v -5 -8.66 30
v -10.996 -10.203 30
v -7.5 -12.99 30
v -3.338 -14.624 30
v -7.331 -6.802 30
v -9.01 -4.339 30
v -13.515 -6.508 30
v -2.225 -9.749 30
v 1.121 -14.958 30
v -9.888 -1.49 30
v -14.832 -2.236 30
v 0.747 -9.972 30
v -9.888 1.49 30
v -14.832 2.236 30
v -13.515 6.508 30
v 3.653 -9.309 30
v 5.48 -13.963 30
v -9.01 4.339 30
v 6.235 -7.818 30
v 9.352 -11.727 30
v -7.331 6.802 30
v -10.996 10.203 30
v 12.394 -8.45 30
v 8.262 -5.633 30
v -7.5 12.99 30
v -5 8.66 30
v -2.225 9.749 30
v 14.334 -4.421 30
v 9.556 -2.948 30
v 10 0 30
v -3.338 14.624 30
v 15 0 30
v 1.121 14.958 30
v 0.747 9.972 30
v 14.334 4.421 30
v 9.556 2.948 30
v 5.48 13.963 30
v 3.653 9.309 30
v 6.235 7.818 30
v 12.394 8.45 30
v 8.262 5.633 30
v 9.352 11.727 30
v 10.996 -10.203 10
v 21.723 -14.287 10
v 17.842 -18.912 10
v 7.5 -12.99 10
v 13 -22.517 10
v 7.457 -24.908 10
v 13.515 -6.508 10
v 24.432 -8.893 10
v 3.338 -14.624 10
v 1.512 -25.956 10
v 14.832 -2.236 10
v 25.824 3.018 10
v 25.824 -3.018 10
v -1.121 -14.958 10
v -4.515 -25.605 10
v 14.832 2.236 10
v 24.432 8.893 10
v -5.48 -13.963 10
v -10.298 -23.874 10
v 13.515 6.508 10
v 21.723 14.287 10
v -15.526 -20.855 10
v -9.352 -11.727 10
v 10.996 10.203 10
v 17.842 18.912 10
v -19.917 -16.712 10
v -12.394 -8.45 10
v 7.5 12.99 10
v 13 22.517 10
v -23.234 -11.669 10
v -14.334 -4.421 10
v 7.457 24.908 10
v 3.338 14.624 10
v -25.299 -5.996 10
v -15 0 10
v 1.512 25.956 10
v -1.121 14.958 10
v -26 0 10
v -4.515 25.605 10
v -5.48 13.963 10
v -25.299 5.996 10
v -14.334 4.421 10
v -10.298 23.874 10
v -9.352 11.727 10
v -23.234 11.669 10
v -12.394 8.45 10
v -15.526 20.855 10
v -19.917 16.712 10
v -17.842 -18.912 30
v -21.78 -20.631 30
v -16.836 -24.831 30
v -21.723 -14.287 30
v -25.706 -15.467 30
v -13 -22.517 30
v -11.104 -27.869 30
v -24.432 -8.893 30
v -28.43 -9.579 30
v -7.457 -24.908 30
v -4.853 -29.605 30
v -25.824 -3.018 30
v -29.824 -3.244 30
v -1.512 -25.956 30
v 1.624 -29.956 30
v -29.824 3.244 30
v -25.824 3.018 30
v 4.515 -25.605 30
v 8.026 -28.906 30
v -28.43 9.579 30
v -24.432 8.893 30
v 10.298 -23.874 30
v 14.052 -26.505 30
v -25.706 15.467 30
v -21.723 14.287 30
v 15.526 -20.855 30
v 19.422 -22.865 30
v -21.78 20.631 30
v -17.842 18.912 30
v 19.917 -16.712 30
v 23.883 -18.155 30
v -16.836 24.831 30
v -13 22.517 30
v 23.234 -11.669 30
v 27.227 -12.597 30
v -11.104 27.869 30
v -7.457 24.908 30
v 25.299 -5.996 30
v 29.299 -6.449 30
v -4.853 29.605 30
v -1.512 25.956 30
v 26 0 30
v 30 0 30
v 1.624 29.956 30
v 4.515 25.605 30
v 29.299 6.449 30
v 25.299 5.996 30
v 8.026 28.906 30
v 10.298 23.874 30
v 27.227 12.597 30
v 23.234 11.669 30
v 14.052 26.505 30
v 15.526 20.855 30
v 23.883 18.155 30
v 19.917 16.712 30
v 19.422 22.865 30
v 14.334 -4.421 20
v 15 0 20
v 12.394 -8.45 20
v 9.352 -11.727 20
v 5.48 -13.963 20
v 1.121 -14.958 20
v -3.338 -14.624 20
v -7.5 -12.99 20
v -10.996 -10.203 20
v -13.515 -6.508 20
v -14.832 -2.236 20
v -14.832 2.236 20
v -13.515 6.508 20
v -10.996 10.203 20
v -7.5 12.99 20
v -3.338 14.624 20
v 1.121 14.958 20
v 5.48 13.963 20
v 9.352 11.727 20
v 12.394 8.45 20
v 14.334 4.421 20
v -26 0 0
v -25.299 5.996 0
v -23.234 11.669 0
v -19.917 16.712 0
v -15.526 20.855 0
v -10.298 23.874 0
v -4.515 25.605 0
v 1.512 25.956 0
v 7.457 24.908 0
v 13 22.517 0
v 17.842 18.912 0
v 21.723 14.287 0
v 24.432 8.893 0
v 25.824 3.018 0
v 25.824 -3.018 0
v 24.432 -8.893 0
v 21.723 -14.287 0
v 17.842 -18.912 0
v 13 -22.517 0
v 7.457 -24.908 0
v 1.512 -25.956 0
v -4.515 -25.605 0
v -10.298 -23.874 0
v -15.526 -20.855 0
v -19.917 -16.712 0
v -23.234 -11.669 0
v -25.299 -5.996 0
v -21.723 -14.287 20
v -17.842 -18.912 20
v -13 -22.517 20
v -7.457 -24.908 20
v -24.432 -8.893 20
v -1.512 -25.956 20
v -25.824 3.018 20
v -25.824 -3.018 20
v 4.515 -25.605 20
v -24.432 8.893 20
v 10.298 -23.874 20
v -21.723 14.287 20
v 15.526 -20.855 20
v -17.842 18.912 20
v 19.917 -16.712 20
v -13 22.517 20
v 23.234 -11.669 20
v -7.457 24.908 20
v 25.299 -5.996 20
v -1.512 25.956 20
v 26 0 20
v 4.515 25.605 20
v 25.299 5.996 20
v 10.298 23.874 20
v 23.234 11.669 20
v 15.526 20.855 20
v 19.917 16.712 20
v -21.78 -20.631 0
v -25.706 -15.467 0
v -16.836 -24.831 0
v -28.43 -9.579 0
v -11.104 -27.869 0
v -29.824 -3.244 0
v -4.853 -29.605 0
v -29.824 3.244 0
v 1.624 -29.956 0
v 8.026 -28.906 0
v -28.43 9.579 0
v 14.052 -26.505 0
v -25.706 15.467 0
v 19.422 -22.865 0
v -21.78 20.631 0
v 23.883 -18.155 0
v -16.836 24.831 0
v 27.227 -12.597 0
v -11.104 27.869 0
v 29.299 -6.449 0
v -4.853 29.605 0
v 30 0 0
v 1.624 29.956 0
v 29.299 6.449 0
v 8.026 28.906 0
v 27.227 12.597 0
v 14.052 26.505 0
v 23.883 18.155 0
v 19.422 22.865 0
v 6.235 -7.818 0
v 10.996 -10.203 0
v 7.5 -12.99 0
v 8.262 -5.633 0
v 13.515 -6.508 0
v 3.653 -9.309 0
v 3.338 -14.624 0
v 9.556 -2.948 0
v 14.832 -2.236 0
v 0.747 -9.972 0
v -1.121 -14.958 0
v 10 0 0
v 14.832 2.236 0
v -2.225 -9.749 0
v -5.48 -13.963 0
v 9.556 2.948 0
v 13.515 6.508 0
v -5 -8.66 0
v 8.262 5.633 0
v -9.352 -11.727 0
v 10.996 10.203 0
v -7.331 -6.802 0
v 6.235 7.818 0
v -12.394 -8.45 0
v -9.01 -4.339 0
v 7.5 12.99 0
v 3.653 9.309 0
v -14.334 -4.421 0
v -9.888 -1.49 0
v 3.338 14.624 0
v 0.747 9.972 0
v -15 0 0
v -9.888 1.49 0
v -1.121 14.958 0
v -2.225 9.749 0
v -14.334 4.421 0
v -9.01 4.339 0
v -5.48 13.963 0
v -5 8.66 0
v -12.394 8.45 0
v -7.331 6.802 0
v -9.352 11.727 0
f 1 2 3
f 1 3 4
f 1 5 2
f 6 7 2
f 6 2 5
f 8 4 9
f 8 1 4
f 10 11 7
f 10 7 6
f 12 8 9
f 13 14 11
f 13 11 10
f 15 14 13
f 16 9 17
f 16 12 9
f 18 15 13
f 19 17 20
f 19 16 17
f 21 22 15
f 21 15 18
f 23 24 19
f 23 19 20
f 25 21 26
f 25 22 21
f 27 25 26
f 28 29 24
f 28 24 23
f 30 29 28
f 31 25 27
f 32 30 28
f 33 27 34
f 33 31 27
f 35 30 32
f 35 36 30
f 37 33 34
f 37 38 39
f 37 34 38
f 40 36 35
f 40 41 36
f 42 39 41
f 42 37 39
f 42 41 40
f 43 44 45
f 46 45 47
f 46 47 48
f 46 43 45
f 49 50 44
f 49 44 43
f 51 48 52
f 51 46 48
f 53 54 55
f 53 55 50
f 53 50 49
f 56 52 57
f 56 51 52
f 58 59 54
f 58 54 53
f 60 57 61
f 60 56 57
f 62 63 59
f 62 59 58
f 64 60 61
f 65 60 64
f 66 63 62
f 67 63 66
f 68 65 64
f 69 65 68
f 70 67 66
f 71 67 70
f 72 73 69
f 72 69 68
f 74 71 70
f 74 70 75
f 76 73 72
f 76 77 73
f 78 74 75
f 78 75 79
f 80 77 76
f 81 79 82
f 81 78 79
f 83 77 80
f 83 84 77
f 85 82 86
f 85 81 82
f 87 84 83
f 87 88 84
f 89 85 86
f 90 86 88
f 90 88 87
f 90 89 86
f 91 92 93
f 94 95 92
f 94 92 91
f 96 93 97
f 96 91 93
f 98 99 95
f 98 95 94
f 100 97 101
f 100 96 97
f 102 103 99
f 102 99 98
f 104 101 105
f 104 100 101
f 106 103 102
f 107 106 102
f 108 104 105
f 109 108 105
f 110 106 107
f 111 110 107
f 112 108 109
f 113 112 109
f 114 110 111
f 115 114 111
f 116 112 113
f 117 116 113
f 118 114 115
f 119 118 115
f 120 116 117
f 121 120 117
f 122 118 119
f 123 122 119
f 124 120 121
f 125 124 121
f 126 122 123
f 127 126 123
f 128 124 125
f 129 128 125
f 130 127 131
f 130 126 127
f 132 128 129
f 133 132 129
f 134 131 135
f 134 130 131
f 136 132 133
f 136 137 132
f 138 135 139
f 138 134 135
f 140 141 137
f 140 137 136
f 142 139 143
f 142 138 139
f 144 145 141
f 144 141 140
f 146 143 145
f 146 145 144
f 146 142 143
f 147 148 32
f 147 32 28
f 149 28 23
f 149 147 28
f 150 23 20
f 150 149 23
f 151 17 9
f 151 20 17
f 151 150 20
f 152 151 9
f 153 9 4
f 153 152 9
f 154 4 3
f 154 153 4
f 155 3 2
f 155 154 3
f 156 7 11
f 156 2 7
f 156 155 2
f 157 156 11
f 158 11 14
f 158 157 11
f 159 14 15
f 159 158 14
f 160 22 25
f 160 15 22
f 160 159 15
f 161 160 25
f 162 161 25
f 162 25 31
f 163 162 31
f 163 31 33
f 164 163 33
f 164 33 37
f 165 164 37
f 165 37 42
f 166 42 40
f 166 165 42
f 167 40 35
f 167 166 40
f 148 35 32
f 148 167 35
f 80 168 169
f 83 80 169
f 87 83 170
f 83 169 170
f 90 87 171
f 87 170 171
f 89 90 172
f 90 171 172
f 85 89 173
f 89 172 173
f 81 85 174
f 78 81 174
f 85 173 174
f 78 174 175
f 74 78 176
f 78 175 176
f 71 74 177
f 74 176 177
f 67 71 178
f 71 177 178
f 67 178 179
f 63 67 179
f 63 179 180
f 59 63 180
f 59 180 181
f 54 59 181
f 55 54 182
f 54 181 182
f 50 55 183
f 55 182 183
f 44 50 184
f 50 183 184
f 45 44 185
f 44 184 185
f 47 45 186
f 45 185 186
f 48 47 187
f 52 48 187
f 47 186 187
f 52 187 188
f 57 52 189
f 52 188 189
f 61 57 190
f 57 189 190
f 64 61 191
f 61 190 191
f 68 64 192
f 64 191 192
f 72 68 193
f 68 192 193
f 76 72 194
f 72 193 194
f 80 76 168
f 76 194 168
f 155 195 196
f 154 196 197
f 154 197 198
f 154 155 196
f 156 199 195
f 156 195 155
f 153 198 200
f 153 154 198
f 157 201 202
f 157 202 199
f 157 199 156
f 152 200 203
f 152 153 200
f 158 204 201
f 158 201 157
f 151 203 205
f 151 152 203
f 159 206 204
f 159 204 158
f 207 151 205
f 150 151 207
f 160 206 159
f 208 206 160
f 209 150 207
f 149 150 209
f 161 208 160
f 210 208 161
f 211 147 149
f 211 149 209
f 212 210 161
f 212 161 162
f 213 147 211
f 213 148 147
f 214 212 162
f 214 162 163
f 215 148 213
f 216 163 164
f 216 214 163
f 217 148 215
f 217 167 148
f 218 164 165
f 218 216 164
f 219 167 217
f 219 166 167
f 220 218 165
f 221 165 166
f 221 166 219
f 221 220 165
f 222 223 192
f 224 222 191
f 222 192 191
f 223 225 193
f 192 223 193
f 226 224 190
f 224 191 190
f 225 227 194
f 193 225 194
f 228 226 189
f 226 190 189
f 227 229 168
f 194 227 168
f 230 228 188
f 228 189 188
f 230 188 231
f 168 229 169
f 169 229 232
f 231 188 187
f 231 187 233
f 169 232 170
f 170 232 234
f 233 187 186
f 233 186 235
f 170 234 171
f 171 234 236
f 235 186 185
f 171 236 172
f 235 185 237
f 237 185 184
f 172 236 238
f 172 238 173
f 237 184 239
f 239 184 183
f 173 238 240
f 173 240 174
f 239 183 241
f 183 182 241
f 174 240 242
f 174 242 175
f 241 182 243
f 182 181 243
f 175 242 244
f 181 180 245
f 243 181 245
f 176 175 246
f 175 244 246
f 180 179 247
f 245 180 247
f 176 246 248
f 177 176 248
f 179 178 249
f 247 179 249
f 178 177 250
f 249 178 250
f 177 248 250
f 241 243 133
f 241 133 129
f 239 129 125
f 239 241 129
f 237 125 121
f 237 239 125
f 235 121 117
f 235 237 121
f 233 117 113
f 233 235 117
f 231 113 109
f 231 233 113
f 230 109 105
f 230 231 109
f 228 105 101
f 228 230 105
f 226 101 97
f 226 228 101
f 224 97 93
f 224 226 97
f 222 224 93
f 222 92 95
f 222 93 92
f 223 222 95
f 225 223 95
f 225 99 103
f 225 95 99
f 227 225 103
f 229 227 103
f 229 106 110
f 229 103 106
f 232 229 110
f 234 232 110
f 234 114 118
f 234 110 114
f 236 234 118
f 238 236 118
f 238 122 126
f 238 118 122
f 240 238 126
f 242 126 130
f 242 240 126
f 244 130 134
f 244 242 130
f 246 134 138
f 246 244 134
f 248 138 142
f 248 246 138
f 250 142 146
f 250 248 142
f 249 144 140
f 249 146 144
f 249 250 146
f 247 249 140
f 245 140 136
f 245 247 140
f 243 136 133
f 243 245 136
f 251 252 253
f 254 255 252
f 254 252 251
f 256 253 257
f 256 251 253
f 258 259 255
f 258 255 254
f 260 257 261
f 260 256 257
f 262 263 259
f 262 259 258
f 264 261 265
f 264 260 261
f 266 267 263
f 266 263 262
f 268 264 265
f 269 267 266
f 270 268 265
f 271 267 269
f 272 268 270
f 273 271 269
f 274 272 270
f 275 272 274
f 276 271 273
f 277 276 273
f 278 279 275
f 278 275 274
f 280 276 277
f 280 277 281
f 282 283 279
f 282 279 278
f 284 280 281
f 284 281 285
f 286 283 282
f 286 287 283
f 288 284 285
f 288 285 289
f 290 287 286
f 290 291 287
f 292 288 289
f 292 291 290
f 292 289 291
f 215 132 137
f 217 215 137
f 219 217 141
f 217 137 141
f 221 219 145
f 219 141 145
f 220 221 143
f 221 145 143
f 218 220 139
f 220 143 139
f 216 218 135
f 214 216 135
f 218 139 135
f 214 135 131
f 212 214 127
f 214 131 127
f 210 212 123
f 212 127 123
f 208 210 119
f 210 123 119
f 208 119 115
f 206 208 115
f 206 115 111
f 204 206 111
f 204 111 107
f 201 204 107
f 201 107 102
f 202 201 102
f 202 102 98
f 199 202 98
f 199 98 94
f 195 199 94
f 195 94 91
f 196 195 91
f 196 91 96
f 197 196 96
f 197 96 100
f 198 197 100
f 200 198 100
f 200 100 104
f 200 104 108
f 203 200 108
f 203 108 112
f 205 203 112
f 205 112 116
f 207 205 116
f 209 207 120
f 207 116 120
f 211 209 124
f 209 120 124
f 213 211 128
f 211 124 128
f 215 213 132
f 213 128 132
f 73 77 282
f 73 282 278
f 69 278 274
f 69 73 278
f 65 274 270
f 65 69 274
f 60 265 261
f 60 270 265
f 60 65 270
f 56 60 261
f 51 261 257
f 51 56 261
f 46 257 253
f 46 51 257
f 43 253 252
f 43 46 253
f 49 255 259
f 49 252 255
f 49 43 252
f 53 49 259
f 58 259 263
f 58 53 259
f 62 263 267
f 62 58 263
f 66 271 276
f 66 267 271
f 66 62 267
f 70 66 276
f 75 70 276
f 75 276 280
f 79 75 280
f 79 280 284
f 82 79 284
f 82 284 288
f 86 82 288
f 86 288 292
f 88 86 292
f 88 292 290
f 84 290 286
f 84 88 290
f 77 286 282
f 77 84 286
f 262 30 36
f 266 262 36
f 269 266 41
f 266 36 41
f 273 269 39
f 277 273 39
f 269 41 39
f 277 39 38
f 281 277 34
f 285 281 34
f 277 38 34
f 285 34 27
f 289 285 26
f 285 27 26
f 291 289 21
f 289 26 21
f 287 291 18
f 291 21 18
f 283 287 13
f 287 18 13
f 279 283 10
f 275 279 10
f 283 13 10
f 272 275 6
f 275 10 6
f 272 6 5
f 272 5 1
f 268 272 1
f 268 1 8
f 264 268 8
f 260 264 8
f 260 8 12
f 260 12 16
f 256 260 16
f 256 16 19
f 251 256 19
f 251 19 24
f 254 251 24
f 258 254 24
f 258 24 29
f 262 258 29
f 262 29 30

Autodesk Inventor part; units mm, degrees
ref_plane "YZ Plane" through (0, 0, 0) normal (1, 0, 0) x (0, 1, 0)
ref_plane "XZ Plane" through (0, 0, 0) normal (0, 1, 0) x (-1, 0, 0)
ref_plane "XY Plane" through (0, 0, 0) normal (0, 0, 1) x (1, 0, 0)
sketch "Sketch1" plane through (0, 0, 0) normal (0, 0, 1) x (1, 0, 0)
  circle A0 centre (0, 0) radius 30
  dimension "d0" = 60
extrude "Extrusion1" add sketch "Sketch1" along normal blind 30
sketch "Sketch2" plane through (0, 0, 30) normal (0, 0, 1) x (1, 0, 0)
  circle A0 centre (0, 0) radius 26
  dimension "d3" = 52
extrude "Extrusion2" cut sketch "Sketch2" against normal blind 10
sketch "Sketch3" plane through (0, 0, 0) normal (0, 0, -1) x (-1, 0, 0)
  circle A0 centre (0, 0) radius 26
  dimension "d6" = 52
extrude "Extrusion3" cut sketch "Sketch3" against normal blind 10
sketch "Sketch4" plane through (0, 0, 10) normal (0, 0, -1) x (-1, 0, 0)
  circle A0 centre (0, 0) radius 15
  dimension "d9" = 30
extrude "Extrusion4" add sketch "Sketch4" along normal blind 10
sketch "Sketch5" plane through (0, 0, 20) normal (0, 0, 1) x (1, 0, 0)
  circle A0 centre (0, 0) radius 15
  dimension "d12" = 30
extrude "Extrusion5" add sketch "Sketch5" along normal blind 10
sketch "Sketch6" plane through (0, 0, 30) normal (0, 0, 1) x (1, 0, 0)
  circle A0 centre (0, 0) radius 10
  dimension "d15" = 20
extrude "Extrusion6" cut sketch "Sketch6" against normal blind 30
properties part number "4 - Part 3"
